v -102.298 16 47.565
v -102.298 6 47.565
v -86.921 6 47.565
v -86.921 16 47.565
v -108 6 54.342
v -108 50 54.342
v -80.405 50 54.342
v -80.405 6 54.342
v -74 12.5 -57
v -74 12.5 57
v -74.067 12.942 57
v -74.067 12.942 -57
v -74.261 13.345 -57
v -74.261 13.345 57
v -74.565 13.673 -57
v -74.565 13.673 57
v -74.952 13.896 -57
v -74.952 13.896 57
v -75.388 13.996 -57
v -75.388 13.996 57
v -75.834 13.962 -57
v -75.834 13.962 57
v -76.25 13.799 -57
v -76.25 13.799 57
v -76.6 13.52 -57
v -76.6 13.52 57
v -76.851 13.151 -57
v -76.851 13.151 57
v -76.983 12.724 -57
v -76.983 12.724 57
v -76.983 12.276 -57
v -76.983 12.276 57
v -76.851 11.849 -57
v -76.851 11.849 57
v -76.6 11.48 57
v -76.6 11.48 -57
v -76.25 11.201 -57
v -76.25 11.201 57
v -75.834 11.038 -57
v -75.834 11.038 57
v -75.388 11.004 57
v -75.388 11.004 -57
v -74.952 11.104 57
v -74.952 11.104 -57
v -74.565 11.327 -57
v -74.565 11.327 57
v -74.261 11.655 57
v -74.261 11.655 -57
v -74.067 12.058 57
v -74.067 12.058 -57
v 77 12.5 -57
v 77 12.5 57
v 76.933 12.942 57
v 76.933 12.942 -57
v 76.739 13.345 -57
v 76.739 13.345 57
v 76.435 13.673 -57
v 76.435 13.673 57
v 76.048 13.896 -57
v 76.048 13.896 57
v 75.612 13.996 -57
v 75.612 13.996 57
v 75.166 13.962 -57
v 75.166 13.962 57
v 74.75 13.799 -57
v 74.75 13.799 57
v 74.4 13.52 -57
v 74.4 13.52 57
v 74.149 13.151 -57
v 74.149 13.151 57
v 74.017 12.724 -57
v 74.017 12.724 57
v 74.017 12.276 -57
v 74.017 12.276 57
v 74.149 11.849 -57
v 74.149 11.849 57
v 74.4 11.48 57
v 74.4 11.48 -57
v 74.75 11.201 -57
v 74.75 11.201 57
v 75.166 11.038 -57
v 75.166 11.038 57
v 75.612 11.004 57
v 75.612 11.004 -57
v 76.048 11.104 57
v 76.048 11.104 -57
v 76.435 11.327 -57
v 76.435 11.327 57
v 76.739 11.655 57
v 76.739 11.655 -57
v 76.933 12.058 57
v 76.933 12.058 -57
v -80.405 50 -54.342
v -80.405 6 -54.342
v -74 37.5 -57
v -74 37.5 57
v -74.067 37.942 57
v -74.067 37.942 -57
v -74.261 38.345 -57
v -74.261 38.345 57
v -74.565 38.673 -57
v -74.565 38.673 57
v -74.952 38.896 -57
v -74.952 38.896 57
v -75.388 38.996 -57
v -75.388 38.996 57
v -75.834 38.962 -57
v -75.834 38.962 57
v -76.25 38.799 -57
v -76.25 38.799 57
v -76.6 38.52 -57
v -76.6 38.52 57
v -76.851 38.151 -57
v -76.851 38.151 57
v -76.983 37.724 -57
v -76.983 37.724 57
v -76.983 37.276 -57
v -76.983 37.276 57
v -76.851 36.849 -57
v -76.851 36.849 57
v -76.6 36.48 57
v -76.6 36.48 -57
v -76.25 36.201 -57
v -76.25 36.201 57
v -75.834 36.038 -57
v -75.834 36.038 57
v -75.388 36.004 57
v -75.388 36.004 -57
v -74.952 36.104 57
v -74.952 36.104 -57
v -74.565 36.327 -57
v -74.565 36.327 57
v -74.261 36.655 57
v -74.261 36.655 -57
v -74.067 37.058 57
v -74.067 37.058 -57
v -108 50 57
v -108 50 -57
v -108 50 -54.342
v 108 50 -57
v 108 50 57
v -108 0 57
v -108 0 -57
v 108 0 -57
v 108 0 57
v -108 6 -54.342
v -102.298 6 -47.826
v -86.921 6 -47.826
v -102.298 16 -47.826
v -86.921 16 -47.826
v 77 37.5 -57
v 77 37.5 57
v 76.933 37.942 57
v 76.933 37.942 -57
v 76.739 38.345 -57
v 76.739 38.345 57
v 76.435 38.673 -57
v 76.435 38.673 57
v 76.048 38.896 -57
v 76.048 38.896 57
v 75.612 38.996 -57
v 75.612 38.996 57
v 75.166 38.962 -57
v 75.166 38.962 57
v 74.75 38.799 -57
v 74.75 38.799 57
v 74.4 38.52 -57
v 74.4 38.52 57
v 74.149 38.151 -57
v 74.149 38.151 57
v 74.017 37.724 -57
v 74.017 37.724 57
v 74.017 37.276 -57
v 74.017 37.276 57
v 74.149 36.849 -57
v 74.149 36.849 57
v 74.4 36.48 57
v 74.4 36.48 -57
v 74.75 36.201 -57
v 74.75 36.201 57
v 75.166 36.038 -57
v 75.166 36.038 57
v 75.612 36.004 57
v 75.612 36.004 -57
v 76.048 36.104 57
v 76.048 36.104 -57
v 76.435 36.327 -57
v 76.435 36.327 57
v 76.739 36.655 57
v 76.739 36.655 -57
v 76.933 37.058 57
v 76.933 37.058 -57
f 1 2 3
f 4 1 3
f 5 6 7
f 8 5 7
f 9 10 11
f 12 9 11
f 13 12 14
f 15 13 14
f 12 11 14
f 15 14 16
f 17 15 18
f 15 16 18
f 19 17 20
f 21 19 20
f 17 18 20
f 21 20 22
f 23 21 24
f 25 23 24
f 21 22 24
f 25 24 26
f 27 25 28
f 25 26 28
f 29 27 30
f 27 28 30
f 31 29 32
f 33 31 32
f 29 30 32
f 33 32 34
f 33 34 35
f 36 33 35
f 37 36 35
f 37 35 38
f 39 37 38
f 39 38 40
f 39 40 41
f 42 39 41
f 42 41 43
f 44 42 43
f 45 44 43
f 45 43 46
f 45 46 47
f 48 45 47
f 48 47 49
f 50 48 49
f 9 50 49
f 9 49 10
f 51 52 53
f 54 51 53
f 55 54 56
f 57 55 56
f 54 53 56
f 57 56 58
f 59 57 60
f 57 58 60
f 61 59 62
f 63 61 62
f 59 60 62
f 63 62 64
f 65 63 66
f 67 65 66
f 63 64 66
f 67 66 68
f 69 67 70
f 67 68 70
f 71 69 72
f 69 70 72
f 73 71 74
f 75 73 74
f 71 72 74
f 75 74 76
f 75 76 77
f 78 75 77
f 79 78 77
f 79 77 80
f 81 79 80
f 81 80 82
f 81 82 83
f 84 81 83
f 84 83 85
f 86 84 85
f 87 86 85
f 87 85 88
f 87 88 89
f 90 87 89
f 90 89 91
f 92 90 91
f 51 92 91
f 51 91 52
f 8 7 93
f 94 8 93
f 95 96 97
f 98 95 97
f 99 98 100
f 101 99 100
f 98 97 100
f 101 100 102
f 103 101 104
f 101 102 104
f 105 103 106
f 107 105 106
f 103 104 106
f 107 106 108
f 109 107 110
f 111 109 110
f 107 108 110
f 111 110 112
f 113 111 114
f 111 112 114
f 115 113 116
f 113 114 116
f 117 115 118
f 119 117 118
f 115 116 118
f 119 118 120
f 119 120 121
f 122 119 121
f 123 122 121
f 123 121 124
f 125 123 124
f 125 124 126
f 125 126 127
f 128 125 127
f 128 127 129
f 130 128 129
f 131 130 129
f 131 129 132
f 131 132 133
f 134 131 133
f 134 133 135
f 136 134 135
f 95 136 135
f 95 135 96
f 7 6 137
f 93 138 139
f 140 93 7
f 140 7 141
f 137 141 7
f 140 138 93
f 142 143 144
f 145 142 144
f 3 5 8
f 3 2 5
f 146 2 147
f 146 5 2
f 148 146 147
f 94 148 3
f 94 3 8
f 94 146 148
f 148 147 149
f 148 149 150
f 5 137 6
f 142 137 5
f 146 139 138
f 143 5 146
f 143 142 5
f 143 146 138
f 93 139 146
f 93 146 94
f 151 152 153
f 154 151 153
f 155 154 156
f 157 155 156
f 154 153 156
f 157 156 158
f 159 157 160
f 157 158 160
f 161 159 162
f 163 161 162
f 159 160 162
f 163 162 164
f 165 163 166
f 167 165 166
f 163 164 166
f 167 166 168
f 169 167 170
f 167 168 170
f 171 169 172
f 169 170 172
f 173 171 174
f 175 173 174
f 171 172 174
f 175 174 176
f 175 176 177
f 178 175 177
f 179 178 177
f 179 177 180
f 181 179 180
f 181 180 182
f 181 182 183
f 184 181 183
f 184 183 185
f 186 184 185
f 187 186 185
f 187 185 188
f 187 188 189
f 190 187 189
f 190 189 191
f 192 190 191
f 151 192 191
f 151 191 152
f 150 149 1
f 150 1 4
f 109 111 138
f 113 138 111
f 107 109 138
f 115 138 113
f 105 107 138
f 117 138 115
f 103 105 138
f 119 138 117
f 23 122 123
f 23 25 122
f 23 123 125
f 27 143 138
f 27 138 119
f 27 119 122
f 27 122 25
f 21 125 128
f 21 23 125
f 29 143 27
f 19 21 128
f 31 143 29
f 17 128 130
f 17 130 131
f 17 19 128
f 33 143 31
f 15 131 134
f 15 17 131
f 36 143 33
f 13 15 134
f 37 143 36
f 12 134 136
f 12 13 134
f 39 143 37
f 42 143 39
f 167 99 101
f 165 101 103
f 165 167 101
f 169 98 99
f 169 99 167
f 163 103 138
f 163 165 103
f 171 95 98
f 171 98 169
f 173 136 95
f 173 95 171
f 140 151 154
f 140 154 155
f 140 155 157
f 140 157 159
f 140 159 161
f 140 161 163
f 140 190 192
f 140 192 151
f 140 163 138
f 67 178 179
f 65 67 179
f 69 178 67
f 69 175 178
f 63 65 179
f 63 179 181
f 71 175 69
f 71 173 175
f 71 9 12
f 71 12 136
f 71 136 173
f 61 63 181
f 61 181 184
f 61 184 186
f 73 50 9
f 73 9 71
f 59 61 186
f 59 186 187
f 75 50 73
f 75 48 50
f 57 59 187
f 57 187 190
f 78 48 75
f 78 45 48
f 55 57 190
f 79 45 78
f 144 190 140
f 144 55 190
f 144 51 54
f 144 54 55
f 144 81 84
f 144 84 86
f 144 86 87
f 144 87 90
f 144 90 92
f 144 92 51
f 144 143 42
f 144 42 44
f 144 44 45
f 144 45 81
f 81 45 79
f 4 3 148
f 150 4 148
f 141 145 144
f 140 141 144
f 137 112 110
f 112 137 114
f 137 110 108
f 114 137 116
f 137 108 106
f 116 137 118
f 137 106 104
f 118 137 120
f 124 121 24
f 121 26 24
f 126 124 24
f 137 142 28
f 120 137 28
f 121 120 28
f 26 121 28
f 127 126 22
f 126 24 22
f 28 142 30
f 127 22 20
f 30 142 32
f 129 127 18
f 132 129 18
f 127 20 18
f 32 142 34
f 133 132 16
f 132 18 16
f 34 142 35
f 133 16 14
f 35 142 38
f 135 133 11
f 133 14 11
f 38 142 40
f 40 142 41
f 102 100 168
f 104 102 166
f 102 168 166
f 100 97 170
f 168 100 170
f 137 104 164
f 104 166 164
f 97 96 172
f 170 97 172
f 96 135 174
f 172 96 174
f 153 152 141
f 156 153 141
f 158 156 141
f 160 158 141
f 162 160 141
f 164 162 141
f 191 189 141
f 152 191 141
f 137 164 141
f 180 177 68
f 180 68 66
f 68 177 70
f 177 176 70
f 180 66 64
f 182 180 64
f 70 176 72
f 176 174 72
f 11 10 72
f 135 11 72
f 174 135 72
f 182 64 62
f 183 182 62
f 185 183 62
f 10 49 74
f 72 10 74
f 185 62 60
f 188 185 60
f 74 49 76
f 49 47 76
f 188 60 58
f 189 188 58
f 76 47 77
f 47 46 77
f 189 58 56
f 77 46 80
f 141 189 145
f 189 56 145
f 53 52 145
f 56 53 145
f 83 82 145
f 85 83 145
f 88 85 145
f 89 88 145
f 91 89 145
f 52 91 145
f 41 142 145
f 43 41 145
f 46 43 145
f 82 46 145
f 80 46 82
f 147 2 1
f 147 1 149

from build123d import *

# Parameters (mm, degrees)
SKETCH_1_W          = 216
SKETCH_1_H          = 114
EXTRUDE_1_DEPTH     = 50
SKETCH_2_W          = 27.595124593
SKETCH_2_H          = 108.683413436
CUT_EXTRUDE_1_DEPTH = 44
SKETCH_3_W          = 15.377269527
SKETCH_3_H          = 95.391197403
EXTRUDE_2_DEPTH     = 10
SKETCH_4_R          = 1.5
CUT_EXTRUDE_2_DEPTH = 115


with BuildPart() as part:
    # 草图1 → 凸台-拉伸1 (new body)
    with BuildSketch(Plane(origin=(0, 0, 0), x_dir=(1, 0, 0), z_dir=(0, 1, 0))):
        Rectangle(SKETCH_1_W, SKETCH_1_H)
    extrude(amount=EXTRUDE_1_DEPTH)

    # 草图2 → 切除-拉伸1 (cut)
    with BuildSketch(Plane(origin=(0, 50, 0), x_dir=(1, 0, 0), z_dir=(0, 1, 0))):
        with Locations((-94.202437704, 0)):
            Rectangle(SKETCH_2_W, SKETCH_2_H)
    extrude(amount=-CUT_EXTRUDE_1_DEPTH, mode=Mode.SUBTRACT)

    # 草图3 → 凸台-拉伸2 (add)
    with BuildSketch(Plane(origin=(0, 6, 0), x_dir=(1, 0, 0), z_dir=(0, 1, 0))):
        with Locations((-94.609302344, 0.130315844)):
            Rectangle(SKETCH_3_W, SKETCH_3_H)
    extrude(amount=EXTRUDE_2_DEPTH)

    # 草图4 → 切除-拉伸2 (cut, through all)
    with BuildSketch(Plane.XY.offset(57)):
        with Locations((75.5, 37.5)):
            Circle(SKETCH_4_R)
        with Locations((75.5, 12.5)):
            Circle(SKETCH_4_R)
        with Locations((-75.5, 12.5)):
            Circle(SKETCH_4_R)
        with Locations((-75.5, 37.5)):
            Circle(SKETCH_4_R)
    extrude(amount=-CUT_EXTRUDE_2_DEPTH, mode=Mode.SUBTRACT)


solid = part.part
